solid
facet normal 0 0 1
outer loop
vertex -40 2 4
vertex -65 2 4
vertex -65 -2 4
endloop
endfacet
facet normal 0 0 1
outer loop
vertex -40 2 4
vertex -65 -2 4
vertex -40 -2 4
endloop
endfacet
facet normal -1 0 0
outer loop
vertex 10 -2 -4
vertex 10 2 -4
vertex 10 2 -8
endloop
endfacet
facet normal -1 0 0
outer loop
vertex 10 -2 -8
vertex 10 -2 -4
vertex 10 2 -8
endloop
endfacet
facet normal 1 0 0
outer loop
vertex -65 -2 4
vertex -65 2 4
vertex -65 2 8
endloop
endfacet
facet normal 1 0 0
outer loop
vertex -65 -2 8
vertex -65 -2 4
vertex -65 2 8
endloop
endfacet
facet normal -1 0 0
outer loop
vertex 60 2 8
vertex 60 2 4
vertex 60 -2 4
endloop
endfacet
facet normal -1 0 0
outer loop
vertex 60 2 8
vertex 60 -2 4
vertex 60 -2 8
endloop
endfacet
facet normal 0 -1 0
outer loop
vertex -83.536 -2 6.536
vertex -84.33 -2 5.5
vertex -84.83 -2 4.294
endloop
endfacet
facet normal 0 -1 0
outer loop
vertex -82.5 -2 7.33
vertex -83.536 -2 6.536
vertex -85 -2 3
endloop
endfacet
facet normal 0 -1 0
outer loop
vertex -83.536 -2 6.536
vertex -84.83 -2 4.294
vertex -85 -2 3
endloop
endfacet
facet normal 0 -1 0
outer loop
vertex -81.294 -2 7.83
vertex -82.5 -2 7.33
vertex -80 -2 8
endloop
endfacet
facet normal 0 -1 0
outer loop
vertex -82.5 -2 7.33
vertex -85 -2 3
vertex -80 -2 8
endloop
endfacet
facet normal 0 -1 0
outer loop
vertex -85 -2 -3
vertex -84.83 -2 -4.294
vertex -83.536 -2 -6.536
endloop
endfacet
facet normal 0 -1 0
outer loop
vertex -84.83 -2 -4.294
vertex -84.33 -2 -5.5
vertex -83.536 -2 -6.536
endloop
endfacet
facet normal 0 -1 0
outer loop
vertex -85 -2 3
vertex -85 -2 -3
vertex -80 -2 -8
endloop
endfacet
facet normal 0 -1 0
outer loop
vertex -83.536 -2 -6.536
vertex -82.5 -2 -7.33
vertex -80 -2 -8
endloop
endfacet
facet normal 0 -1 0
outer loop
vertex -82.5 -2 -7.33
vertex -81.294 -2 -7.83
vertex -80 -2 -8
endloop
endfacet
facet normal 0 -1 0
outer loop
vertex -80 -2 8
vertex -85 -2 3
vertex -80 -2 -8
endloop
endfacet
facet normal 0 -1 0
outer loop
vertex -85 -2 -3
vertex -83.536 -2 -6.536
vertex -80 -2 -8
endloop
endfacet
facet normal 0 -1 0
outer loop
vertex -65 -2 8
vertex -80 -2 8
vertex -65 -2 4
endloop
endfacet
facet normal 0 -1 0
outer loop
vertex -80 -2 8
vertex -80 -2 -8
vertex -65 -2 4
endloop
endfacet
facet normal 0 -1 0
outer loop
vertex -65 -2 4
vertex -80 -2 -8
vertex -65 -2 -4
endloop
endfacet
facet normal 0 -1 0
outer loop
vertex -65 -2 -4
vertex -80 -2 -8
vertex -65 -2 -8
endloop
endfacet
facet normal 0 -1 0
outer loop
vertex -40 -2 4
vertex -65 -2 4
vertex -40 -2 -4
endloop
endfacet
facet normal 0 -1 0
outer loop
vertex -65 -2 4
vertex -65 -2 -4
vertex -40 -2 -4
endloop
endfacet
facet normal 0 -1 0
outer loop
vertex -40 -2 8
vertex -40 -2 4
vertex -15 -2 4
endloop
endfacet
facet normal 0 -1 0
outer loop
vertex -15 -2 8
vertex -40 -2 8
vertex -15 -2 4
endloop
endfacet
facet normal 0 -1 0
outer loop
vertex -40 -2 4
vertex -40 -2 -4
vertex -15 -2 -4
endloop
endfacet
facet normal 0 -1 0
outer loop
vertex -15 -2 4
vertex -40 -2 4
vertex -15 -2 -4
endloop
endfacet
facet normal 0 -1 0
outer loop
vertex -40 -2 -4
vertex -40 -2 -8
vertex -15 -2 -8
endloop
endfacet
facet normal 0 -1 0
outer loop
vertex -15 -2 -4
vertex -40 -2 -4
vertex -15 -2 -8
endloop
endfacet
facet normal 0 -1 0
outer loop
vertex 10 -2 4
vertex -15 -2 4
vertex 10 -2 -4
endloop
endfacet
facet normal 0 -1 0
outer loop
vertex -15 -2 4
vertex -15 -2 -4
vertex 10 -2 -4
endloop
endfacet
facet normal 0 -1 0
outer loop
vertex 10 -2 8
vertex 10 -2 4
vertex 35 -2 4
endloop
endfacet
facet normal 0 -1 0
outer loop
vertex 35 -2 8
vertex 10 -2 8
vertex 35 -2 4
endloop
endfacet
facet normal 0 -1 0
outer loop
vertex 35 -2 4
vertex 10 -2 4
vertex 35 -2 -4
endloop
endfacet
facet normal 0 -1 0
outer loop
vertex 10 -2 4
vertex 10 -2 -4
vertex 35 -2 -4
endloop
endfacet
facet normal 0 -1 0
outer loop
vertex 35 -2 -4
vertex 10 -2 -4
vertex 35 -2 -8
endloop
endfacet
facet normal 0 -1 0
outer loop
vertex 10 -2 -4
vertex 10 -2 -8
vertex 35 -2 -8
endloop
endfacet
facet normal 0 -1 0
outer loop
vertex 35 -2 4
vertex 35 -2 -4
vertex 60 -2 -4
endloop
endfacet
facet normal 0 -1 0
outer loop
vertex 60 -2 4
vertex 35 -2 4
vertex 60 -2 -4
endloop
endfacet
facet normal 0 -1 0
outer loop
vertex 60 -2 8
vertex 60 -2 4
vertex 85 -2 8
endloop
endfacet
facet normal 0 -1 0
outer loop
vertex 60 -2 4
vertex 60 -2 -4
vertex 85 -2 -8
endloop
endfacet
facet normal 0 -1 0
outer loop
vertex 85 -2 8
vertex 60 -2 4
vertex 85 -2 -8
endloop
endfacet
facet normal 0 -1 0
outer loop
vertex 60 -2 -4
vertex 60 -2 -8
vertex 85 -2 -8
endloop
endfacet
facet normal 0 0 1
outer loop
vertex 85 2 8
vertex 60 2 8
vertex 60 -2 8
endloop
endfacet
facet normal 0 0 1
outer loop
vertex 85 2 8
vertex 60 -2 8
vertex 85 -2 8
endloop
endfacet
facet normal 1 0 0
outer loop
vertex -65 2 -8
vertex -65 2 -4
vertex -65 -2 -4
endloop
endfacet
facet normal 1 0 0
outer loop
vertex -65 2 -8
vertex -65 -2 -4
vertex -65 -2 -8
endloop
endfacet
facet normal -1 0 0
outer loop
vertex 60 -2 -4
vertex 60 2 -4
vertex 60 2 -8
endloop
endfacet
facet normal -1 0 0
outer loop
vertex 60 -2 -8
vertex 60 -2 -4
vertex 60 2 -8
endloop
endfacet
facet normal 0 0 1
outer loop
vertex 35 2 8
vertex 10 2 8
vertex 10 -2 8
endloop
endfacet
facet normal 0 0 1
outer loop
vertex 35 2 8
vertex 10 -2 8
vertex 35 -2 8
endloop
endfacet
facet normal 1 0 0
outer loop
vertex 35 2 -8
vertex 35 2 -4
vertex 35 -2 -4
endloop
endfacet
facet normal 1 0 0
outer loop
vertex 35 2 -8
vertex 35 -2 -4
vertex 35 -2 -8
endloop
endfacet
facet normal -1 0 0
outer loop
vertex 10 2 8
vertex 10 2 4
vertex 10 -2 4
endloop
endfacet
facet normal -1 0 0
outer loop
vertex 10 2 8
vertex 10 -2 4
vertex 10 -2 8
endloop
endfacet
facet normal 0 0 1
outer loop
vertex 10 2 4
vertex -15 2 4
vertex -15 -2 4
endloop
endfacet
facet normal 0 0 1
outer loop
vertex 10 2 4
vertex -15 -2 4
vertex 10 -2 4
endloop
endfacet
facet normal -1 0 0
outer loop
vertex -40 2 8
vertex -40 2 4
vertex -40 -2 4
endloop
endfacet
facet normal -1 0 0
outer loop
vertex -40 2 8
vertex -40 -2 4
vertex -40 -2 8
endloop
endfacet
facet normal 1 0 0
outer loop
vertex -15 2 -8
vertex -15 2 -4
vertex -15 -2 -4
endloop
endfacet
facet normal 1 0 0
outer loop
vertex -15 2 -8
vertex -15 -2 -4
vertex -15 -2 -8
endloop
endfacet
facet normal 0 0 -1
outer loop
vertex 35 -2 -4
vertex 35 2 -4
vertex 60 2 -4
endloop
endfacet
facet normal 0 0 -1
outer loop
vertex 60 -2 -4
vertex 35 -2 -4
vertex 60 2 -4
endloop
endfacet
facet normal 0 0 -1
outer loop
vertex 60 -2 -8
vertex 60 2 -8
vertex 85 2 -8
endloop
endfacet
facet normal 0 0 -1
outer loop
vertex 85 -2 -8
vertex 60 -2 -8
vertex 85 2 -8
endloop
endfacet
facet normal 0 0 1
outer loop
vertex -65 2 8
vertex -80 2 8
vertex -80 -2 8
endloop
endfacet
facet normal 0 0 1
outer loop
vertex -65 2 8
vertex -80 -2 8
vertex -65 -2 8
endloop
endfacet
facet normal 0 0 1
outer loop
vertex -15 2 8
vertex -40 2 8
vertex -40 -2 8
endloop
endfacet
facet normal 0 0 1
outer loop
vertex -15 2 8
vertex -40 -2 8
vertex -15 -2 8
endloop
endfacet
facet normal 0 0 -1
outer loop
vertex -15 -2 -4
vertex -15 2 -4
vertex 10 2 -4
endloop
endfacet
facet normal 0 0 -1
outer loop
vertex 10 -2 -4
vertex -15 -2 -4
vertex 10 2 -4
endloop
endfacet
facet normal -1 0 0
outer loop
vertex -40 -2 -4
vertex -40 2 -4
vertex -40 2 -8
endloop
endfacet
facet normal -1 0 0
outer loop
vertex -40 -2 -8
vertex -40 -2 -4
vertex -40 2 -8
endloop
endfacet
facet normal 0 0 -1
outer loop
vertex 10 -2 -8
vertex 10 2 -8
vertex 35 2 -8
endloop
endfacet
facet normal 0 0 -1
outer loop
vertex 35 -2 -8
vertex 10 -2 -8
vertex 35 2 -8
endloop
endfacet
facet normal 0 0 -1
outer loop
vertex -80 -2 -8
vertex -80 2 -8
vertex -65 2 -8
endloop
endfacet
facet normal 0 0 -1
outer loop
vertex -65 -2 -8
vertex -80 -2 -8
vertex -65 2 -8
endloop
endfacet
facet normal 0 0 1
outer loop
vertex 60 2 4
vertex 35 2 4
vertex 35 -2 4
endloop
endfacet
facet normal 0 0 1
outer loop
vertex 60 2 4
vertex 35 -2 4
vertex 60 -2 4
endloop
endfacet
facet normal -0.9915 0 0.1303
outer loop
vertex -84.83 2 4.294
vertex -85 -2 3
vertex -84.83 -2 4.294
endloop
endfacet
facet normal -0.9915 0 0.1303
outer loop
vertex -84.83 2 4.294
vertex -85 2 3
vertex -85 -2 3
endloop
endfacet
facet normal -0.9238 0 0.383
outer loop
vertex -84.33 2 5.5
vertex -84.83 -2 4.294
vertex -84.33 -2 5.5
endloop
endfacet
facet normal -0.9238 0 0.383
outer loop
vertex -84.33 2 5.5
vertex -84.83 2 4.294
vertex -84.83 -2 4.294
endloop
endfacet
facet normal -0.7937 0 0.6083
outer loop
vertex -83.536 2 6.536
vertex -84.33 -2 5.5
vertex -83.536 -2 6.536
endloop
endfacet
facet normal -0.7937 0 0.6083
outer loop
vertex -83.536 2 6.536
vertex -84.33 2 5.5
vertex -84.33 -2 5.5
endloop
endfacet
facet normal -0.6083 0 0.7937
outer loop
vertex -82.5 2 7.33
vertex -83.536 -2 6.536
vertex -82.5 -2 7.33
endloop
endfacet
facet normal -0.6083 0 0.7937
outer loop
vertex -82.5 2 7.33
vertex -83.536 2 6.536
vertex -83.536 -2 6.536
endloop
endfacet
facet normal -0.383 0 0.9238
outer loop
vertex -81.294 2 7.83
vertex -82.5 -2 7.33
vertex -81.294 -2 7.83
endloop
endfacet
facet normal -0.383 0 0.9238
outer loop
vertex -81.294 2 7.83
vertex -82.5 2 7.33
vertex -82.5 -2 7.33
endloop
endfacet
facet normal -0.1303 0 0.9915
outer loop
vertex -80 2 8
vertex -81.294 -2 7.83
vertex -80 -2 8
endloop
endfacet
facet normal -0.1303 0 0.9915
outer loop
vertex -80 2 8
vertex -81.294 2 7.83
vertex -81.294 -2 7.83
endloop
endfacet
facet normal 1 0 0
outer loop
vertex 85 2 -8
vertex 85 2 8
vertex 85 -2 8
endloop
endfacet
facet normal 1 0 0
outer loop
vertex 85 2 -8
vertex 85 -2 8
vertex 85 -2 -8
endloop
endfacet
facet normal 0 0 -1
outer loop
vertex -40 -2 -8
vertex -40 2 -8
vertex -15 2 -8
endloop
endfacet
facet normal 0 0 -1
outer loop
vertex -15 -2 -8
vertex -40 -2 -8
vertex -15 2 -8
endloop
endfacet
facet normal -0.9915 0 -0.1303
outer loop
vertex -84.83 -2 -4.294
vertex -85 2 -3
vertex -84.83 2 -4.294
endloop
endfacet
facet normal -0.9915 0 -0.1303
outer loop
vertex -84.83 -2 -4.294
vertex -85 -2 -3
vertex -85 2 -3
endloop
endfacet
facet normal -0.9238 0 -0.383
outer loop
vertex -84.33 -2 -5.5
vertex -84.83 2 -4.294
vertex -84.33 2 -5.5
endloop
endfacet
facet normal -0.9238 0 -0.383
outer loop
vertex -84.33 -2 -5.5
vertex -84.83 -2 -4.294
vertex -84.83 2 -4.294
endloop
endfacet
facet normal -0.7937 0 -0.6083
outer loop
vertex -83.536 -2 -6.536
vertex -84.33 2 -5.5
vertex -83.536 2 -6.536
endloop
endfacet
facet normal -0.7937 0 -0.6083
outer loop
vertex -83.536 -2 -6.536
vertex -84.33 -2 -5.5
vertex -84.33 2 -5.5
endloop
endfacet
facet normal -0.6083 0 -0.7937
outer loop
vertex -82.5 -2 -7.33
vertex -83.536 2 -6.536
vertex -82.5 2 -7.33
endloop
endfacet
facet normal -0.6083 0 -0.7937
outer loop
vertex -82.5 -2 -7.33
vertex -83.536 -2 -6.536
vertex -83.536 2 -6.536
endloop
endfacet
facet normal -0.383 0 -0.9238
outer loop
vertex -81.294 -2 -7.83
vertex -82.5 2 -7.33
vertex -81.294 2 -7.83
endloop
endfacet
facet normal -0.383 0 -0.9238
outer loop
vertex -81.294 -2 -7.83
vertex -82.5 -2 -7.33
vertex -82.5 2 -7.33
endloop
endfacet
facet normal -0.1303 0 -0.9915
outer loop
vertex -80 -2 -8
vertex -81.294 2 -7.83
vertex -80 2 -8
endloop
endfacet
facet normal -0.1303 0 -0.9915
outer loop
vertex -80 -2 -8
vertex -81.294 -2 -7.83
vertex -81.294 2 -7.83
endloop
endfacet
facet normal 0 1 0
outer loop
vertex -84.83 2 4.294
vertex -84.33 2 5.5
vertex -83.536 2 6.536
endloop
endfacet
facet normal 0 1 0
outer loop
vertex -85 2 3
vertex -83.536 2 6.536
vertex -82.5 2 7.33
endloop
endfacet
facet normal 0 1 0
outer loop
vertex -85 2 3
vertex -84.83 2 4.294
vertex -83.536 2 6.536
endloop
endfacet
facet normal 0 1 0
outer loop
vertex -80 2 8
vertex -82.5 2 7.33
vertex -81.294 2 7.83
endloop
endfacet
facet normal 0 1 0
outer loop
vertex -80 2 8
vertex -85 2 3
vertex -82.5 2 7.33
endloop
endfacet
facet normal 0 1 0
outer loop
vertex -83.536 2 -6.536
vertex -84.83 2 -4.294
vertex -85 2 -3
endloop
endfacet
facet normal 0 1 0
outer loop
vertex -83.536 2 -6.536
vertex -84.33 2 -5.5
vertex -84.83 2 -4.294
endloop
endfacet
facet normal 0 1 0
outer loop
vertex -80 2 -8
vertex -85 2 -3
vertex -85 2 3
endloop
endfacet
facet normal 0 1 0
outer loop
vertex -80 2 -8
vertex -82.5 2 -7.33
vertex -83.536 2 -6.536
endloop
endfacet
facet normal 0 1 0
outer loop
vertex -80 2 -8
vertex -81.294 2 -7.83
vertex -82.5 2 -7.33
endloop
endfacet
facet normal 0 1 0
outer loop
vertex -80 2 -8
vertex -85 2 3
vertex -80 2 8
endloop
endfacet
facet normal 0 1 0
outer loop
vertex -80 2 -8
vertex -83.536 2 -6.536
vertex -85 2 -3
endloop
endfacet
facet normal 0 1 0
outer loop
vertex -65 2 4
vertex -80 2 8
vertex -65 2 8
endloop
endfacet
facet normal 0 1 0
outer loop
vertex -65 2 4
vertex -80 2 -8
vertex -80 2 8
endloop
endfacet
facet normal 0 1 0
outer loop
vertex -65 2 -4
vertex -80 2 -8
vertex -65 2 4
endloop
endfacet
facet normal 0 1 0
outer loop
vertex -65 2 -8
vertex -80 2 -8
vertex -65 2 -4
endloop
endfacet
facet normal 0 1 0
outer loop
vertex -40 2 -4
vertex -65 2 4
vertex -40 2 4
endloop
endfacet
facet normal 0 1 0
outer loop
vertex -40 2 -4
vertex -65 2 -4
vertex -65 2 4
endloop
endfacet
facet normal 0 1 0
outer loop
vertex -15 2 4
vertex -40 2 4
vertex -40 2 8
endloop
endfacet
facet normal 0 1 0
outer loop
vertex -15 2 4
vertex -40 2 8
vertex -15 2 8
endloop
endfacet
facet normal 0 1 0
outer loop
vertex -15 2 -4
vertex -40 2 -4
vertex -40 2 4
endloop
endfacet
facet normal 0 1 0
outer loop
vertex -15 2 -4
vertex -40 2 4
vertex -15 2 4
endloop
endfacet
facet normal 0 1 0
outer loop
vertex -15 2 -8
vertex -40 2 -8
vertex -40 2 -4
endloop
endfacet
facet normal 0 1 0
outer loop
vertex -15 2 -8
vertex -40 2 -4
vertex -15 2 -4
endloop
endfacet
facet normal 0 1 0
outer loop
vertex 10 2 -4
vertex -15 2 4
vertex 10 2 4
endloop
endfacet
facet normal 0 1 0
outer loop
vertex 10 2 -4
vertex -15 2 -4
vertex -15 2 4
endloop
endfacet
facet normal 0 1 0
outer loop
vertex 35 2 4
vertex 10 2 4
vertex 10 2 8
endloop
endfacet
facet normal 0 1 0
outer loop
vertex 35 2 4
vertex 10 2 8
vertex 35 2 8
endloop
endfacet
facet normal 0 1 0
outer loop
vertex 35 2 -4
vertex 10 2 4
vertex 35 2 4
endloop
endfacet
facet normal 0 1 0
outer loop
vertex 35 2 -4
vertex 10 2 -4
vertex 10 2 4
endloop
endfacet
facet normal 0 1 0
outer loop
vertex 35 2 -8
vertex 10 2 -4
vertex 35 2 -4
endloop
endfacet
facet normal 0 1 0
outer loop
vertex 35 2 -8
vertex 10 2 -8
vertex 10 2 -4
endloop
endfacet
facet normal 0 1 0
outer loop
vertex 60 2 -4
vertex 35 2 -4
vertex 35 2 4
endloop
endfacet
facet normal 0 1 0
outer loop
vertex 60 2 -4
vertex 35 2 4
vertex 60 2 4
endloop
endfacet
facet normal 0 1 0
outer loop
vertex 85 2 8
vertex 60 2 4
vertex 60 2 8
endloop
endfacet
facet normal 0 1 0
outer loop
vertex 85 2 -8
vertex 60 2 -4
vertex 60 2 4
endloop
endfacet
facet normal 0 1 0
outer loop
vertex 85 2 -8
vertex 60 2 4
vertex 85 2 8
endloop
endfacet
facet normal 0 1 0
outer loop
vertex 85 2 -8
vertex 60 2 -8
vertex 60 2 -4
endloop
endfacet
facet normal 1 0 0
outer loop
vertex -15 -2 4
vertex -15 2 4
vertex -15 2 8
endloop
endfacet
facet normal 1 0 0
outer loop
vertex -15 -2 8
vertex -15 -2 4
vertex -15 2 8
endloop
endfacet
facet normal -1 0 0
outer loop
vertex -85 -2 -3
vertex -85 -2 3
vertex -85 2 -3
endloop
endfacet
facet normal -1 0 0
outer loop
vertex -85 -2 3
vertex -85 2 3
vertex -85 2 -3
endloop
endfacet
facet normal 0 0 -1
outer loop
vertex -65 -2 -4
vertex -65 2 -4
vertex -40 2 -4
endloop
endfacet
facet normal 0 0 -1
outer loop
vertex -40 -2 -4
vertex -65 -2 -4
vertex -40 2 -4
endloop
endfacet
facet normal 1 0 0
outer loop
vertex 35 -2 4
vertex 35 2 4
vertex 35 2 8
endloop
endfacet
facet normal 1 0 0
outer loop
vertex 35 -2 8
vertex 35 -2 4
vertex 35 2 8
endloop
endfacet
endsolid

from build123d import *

# Parameters (mm, degrees)
SKETCH1_W           = 170
SKETCH1_H           = 16
BOSS_EXTRUDE1_DEPTH = 2
SKETCH2_W           = 25
SKETCH2_H           = 4
CUT_EXTRUDE1_DEPTH  = 86.469292731
FILLET1_R           = 5


with BuildPart() as part:
    # Sketch1 → Boss-Extrude1 (new, symmetric)
    with BuildSketch(Plane(origin=(0, 0, 0), x_dir=(1, 0, 0), z_dir=(0, 1, 0))):
        Rectangle(SKETCH1_W, SKETCH1_H)
    extrude(amount=BOSS_EXTRUDE1_DEPTH, both=True)

    # Sketch2 → Cut-Extrude1 (cut, through all)
    with BuildSketch(Plane(origin=(0, 2, 0), x_dir=(1, 0, 0), z_dir=(0, 1, 0))):
        with Locations((47.5, 6)):
            Rectangle(SKETCH2_W, SKETCH2_H)
        with Locations((-2.5, 6)):
            Rectangle(SKETCH2_W, SKETCH2_H)
        with Locations((-52.5, 6)):
            Rectangle(SKETCH2_W, SKETCH2_H)
        with Locations((-102.5, 6)):
            Rectangle(SKETCH2_W, SKETCH2_H)
        with Locations((-152.5, 6)):
            Rectangle(SKETCH2_W, SKETCH2_H)
        with Locations((-202.5, 6)):
            Rectangle(SKETCH2_W, SKETCH2_H)
        with Locations((-252.5, 6)):
            Rectangle(SKETCH2_W, SKETCH2_H)
        with Locations((-302.5, 6)):
            Rectangle(SKETCH2_W, SKETCH2_H)
        with Locations((-352.5, 6)):
            Rectangle(SKETCH2_W, SKETCH2_H)
        with Locations((-402.5, 6)):
            Rectangle(SKETCH2_W, SKETCH2_H)
    cut_extrude1 = extrude(amount=-CUT_EXTRUDE1_DEPTH, mode=Mode.SUBTRACT)

    # Mirror1: Cut-Extrude1 across plane
    add(cut_extrude1.mirror(Plane.XY), mode=Mode.SUBTRACT)

    # Fillet1
    fillet1_edges = [part.edges().sort_by_distance(p)[0] for p in [
        (-85, 0, 8),
        (-85, 0, -8),
    ]]
    fillet(fillet1_edges, radius=FILLET1_R)


solid = part.part
